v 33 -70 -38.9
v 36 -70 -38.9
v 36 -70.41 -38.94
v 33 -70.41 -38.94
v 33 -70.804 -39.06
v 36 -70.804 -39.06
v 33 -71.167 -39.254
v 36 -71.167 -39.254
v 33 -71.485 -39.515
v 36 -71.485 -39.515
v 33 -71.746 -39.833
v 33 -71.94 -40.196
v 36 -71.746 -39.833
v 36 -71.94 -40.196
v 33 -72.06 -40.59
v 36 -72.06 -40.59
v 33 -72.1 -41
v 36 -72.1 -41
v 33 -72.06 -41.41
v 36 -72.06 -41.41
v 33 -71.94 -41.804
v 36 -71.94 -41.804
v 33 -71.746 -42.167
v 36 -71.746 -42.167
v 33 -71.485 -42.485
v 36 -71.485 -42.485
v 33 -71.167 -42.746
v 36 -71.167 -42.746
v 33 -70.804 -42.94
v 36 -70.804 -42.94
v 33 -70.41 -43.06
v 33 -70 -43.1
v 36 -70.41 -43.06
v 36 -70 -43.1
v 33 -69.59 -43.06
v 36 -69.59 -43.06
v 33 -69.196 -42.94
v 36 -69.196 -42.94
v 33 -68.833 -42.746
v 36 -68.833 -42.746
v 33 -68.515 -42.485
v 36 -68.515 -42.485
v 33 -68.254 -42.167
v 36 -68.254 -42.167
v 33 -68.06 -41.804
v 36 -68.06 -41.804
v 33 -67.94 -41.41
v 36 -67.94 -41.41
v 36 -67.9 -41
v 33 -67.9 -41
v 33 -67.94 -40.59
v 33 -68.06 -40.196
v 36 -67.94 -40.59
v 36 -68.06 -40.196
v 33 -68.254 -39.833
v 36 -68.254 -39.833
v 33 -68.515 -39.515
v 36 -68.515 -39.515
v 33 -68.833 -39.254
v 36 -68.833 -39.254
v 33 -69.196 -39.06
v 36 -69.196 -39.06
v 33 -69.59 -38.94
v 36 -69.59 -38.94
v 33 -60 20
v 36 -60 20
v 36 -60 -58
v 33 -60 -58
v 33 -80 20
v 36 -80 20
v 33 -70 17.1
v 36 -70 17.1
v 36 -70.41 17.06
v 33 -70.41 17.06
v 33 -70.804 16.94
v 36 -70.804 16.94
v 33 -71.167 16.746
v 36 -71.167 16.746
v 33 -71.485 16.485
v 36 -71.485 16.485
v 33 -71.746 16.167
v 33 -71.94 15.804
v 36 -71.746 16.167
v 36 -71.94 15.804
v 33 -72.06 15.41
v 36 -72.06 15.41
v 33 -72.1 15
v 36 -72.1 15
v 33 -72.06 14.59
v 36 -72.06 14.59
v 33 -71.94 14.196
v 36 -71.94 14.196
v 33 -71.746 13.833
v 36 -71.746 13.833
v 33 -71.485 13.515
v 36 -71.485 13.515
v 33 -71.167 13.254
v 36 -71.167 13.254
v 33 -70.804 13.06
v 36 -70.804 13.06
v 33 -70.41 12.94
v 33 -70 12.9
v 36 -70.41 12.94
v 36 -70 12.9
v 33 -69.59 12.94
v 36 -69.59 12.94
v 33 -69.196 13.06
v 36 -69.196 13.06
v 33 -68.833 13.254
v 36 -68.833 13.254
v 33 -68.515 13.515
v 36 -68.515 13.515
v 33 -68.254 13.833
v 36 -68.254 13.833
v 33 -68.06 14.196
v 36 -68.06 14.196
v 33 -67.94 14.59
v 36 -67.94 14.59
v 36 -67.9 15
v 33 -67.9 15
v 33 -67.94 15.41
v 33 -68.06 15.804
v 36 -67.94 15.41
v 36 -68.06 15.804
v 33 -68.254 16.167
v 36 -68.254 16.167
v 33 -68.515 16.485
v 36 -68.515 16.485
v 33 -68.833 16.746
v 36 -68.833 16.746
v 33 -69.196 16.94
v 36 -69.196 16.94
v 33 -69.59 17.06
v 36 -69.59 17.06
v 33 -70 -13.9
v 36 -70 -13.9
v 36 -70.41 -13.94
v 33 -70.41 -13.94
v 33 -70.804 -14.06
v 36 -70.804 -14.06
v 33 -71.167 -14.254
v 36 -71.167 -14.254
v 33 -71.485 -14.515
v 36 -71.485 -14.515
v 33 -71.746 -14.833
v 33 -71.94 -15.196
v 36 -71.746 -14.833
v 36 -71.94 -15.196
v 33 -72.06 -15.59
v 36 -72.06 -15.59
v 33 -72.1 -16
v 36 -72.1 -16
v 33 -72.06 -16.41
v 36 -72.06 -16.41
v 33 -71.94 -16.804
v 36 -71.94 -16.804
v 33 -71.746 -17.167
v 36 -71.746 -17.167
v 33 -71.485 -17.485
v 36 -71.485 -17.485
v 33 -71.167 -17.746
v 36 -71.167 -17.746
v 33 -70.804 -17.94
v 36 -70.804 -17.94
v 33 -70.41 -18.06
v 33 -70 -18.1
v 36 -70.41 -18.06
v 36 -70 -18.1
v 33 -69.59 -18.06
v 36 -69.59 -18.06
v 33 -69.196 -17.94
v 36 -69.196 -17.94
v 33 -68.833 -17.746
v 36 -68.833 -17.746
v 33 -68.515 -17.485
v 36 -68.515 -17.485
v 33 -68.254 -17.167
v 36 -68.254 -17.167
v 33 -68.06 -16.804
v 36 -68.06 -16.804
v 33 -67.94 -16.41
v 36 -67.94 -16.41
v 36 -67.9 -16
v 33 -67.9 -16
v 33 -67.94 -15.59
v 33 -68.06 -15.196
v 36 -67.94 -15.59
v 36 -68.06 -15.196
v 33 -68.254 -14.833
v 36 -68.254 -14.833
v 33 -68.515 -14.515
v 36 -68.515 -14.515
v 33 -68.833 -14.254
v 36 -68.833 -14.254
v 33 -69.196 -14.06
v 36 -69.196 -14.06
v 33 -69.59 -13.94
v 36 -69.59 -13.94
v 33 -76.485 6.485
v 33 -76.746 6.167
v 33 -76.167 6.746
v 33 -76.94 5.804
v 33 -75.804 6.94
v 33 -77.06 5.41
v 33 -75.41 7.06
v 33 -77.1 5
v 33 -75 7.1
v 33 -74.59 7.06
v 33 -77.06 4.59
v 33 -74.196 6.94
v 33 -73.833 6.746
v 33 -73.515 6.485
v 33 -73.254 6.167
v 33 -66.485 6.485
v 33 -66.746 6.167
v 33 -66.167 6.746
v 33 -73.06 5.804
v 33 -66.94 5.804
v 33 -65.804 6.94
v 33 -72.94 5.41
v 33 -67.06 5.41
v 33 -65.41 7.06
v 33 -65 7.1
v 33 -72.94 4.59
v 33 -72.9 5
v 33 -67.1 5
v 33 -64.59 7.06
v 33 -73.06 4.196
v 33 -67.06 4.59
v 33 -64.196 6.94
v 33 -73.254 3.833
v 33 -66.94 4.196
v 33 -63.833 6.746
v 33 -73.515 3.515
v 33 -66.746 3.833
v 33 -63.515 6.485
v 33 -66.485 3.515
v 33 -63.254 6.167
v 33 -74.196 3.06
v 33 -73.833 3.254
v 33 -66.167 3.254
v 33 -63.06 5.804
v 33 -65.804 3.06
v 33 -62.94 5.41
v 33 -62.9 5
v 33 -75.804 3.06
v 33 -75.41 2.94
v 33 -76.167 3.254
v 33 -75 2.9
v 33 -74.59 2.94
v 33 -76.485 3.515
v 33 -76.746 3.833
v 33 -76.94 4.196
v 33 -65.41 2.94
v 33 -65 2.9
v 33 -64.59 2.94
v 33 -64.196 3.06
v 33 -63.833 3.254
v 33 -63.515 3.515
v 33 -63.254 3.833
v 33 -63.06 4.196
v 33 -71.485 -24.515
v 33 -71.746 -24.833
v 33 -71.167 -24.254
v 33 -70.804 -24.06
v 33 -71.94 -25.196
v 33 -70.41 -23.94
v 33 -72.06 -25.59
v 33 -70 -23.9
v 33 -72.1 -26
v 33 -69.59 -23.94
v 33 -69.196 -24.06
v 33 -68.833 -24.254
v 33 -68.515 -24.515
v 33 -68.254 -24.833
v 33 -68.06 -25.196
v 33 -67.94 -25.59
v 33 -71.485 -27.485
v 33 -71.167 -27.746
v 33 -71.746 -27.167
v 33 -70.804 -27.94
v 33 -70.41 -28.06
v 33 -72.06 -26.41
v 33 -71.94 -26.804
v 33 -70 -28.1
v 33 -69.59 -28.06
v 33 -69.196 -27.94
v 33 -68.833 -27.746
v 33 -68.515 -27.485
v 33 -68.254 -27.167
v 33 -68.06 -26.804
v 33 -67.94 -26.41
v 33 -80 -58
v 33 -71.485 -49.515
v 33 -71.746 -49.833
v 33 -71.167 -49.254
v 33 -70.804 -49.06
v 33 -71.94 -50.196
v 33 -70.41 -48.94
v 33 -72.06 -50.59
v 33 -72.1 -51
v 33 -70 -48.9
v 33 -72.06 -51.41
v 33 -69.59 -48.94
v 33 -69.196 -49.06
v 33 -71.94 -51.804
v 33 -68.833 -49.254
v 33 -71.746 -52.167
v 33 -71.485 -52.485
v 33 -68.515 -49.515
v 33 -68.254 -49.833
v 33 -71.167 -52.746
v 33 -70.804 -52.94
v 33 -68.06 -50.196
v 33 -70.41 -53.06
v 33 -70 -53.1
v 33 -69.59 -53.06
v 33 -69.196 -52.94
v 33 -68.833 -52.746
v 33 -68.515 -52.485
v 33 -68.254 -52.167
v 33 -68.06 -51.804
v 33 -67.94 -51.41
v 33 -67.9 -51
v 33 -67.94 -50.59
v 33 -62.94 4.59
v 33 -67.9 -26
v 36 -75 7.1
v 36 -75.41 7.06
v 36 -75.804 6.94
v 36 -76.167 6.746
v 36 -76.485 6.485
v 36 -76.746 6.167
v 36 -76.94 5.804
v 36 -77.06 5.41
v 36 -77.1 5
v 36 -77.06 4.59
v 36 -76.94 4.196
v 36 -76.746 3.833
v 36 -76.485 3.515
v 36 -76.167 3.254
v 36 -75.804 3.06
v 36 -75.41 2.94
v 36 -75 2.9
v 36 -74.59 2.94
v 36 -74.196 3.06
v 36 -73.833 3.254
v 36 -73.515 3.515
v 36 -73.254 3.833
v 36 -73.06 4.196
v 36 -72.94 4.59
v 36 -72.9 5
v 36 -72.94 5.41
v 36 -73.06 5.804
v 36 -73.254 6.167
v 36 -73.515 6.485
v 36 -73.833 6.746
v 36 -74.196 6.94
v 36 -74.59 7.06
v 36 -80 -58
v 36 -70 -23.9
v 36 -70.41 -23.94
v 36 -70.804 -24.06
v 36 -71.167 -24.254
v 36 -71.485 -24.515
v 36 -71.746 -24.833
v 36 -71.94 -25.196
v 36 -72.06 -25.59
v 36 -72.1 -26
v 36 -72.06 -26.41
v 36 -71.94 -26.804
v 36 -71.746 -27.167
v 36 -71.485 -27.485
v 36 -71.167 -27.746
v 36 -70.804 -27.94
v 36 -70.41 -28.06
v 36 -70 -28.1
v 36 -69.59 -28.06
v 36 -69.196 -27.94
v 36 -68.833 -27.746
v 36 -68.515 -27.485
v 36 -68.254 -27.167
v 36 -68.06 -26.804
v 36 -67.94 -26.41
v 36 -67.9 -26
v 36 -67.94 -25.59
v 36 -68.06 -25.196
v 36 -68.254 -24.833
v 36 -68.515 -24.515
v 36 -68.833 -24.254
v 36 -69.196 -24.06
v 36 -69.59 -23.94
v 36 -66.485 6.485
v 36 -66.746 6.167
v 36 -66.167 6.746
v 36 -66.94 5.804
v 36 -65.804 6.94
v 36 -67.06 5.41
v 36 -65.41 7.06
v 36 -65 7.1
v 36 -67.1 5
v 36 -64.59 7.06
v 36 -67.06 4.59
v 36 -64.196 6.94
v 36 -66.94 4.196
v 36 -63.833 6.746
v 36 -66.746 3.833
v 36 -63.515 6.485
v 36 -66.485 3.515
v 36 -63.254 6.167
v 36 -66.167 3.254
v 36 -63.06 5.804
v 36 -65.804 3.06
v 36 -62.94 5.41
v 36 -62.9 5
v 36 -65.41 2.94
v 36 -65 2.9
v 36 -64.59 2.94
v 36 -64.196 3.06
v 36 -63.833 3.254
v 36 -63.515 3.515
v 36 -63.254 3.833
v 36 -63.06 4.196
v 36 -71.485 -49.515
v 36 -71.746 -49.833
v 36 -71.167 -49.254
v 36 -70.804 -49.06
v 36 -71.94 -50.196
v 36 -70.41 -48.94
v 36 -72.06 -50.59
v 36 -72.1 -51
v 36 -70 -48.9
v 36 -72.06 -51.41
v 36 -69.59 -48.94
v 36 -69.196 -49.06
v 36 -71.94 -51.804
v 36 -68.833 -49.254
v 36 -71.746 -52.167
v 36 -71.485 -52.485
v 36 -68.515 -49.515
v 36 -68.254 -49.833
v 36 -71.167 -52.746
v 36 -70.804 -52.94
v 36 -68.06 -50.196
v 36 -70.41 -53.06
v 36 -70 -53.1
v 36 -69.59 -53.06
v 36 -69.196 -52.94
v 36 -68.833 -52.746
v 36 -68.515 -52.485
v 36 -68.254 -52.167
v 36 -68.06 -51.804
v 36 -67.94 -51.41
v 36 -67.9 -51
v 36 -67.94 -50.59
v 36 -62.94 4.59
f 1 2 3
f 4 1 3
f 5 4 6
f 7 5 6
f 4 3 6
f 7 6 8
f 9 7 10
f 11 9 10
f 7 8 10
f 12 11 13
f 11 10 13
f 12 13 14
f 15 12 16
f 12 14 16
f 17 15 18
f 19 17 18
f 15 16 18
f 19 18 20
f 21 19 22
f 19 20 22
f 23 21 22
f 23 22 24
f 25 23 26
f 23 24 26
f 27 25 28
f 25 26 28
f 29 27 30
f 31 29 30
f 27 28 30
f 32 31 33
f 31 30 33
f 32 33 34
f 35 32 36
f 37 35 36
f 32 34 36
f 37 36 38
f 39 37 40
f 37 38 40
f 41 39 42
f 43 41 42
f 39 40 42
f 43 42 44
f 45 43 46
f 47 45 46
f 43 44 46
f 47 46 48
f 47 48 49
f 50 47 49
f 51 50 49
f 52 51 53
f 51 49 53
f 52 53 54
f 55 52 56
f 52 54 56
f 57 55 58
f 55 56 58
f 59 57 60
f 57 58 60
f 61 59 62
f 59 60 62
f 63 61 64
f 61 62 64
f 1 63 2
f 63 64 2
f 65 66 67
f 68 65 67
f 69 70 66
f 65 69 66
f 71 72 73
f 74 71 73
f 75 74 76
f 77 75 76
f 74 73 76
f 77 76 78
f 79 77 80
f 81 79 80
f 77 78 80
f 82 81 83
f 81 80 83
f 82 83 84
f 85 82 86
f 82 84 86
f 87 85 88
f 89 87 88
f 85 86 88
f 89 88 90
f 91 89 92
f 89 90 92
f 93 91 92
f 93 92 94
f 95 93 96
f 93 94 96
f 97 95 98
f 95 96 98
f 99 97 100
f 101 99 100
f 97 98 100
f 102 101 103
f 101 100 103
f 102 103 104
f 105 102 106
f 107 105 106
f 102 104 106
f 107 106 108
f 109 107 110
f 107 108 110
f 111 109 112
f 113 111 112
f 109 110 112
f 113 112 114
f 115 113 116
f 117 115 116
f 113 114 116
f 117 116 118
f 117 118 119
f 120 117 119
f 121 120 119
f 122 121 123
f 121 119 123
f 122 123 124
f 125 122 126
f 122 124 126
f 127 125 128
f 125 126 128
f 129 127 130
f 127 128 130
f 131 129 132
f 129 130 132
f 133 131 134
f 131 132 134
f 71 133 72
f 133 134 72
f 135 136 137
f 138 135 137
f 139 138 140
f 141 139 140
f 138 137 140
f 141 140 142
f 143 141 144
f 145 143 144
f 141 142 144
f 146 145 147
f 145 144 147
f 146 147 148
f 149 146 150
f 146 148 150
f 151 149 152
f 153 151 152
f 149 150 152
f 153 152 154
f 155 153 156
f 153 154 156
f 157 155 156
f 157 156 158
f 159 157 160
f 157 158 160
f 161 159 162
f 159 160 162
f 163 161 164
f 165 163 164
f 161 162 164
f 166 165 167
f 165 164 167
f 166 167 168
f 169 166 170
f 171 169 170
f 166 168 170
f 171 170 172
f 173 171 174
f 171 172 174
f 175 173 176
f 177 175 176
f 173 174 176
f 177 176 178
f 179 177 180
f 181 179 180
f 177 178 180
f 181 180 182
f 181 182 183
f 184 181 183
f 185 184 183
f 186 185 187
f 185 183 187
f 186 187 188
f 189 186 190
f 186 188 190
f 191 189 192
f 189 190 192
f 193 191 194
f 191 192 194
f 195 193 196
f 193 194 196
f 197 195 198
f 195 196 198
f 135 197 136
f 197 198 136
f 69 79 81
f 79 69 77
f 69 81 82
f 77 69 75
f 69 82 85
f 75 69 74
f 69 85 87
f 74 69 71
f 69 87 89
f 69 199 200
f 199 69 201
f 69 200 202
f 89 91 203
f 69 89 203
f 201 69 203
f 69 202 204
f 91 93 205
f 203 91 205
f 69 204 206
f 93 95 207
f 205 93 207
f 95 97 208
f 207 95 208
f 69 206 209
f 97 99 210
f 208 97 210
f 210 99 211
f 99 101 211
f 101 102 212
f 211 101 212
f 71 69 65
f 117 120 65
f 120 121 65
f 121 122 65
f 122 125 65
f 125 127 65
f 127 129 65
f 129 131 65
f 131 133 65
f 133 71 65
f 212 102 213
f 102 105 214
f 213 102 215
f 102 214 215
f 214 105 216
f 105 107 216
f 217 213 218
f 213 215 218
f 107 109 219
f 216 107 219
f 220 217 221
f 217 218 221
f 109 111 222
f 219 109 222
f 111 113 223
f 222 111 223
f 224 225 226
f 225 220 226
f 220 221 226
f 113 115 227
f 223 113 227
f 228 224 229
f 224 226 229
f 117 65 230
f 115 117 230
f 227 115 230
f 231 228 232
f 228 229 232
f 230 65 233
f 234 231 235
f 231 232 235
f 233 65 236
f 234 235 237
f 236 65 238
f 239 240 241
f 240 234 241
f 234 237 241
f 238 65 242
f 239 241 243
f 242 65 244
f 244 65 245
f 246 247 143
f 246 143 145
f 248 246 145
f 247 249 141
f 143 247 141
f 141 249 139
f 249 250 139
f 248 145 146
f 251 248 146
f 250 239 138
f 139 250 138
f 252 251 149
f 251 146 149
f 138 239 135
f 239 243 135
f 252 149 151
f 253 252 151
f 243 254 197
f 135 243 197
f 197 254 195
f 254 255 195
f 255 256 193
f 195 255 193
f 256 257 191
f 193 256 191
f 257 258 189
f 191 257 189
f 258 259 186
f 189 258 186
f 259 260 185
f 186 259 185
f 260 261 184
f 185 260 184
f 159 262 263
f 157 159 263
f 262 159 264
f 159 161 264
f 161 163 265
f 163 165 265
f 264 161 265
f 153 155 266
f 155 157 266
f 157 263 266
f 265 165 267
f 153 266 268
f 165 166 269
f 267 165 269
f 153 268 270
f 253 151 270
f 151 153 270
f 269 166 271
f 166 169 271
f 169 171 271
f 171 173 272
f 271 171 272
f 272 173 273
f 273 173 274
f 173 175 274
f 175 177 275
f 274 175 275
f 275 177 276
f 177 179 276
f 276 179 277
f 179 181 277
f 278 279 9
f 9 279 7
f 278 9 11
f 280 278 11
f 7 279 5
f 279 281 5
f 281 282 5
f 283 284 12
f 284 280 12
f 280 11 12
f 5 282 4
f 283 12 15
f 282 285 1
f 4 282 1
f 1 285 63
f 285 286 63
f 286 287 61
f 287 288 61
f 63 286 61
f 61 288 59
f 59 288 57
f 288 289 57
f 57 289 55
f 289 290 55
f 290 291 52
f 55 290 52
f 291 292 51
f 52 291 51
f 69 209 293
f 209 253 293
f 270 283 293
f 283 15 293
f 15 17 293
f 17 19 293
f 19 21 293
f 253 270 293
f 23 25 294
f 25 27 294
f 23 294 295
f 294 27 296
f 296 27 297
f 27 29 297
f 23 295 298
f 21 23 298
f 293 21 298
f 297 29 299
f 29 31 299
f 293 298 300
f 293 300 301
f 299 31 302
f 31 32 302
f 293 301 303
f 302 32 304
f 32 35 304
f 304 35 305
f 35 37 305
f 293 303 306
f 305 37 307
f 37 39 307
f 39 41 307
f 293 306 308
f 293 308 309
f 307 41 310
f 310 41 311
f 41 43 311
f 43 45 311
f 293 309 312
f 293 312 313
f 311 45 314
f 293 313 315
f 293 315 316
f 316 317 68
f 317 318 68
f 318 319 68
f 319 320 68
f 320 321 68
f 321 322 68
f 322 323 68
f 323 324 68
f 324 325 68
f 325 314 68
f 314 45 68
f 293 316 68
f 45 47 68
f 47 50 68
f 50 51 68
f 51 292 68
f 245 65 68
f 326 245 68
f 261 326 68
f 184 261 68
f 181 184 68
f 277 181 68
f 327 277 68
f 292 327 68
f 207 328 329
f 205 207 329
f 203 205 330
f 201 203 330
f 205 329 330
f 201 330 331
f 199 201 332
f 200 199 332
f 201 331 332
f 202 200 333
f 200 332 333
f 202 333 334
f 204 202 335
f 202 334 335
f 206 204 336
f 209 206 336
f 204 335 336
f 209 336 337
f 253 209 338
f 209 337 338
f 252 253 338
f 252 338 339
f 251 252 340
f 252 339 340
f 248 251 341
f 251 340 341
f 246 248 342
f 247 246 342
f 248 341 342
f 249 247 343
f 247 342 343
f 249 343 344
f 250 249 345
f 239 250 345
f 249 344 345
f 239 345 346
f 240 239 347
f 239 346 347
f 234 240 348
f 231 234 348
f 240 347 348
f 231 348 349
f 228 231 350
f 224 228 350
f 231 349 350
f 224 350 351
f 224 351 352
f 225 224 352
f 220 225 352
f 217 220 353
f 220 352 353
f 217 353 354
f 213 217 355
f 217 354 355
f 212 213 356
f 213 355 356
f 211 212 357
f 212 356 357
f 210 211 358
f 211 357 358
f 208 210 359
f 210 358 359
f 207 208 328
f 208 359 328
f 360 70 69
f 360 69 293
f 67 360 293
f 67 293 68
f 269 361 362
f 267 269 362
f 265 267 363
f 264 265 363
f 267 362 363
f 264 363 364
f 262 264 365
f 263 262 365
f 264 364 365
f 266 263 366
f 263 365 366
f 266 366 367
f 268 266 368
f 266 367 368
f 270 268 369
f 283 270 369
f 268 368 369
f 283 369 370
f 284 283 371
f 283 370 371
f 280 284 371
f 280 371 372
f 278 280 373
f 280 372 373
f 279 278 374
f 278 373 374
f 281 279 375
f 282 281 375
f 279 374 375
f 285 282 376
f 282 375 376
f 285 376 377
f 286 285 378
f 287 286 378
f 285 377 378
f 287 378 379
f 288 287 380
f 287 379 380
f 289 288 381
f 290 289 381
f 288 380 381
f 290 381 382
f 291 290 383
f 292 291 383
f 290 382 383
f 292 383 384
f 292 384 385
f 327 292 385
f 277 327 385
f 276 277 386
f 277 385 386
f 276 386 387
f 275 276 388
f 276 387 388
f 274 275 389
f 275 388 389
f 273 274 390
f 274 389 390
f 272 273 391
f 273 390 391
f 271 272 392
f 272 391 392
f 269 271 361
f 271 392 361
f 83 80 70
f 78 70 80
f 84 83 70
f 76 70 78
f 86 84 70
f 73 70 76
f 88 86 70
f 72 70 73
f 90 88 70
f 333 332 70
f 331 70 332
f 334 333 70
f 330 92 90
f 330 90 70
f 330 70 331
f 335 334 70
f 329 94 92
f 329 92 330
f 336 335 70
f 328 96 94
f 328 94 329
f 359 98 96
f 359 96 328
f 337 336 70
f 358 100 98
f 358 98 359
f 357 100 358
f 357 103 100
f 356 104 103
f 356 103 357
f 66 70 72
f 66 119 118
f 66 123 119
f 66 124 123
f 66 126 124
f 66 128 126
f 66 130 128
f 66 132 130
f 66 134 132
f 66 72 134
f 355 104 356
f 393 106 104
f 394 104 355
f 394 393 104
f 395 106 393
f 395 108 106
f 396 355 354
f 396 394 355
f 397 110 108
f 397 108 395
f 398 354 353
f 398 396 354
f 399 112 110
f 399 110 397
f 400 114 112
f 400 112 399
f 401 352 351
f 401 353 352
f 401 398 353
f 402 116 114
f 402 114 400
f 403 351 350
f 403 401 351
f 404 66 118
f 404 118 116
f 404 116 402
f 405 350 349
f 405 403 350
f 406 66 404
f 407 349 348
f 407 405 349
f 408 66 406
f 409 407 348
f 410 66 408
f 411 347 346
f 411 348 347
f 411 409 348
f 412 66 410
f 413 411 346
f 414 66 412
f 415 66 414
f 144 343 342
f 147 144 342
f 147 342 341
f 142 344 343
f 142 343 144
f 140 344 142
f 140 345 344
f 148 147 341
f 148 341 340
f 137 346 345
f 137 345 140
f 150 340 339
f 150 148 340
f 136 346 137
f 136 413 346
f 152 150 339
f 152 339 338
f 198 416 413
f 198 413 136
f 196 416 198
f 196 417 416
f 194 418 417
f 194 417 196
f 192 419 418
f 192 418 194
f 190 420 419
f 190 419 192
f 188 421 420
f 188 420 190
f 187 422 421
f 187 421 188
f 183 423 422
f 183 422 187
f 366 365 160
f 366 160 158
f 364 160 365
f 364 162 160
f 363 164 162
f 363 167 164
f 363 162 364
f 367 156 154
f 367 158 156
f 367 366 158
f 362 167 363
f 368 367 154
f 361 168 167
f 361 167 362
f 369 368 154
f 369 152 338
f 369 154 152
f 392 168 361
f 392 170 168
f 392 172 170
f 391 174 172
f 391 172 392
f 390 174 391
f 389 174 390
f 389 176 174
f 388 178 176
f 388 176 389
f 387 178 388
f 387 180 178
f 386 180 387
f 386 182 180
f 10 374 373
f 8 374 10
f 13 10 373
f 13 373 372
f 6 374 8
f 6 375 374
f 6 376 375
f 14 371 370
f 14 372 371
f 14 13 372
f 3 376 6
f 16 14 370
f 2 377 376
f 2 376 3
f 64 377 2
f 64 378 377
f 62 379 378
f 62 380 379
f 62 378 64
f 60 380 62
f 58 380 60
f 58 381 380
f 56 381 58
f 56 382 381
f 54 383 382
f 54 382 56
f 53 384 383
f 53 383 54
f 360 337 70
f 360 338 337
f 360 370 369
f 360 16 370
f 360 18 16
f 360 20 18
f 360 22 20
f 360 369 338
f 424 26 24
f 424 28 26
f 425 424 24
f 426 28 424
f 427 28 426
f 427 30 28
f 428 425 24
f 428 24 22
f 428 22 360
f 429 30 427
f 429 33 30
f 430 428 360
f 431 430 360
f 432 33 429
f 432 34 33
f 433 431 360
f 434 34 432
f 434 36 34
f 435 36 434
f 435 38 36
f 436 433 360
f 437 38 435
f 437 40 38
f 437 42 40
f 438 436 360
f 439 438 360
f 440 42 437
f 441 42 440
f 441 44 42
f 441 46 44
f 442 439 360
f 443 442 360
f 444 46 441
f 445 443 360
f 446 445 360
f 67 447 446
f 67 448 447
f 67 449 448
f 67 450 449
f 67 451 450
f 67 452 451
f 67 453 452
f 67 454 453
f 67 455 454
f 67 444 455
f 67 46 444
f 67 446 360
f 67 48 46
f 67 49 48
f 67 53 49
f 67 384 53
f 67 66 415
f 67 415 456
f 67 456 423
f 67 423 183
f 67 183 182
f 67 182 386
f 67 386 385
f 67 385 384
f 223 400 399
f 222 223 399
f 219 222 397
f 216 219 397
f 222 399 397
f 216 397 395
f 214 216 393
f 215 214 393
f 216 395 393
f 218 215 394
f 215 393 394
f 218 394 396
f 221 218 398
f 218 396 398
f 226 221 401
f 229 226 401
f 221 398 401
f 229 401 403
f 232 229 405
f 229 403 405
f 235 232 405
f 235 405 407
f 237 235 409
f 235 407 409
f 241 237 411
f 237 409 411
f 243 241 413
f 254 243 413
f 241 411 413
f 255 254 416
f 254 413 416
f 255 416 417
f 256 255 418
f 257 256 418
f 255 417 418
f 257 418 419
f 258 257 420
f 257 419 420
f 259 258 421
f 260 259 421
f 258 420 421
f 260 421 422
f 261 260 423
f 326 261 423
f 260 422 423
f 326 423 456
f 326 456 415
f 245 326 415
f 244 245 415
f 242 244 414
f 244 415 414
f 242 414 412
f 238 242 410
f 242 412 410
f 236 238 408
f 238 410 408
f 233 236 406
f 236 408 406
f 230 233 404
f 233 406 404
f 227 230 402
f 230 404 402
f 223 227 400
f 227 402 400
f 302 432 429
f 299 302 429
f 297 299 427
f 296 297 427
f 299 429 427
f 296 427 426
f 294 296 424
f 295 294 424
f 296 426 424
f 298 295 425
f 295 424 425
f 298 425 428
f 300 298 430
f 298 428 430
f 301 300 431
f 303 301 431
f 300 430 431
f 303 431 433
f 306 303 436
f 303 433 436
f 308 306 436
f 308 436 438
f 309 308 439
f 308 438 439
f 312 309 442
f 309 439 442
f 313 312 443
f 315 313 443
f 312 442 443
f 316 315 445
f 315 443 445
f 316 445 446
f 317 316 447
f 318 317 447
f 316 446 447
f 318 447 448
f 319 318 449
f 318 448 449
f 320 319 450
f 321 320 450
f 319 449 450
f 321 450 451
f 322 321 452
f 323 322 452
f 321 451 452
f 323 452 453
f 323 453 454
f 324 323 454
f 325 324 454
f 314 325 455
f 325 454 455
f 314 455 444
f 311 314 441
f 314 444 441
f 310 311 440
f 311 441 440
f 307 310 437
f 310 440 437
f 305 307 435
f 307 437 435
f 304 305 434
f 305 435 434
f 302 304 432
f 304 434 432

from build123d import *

# Parameters (mm, degrees)
SKETCH_1_W      = 78
SKETCH_1_H      = 20
SKETCH_1_R      = 2.1
EXTRUDE_1_DEPTH = 3


with BuildPart() as part:
    # 草图1 → 凸台-拉伸1 (new body)
    with BuildSketch(Plane(origin=(36, 0, 0), x_dir=(0, 0, -1), z_dir=(1, 0, 0))):
        with Locations((19, -70)):
            Rectangle(SKETCH_1_W, SKETCH_1_H)
        with Locations(Location((-15, -70, 0), (0, 0, 180))):
            Circle(SKETCH_1_R, mode=Mode.SUBTRACT)
        with Locations(Location((41, -70, 0), (0, 0, 180))):
            Circle(SKETCH_1_R, mode=Mode.SUBTRACT)
        with Locations(Location((51, -70, 0), (0, 0, 180))):
            Circle(SKETCH_1_R, mode=Mode.SUBTRACT)
        with Locations(Location((26, -70, 0), (0, 0, 180))):
            Circle(SKETCH_1_R, mode=Mode.SUBTRACT)
        with Locations(Location((16, -70, 0), (0, 0, 180))):
            Circle(SKETCH_1_R, mode=Mode.SUBTRACT)
        with Locations(Location((-5, -65, 0), (0, 0, 180))):
            Circle(SKETCH_1_R, mode=Mode.SUBTRACT)
        with Locations(Location((-5, -75, 0), (0, 0, 180))):
            Circle(SKETCH_1_R, mode=Mode.SUBTRACT)
    extrude(amount=-EXTRUDE_1_DEPTH)


solid = part.part
